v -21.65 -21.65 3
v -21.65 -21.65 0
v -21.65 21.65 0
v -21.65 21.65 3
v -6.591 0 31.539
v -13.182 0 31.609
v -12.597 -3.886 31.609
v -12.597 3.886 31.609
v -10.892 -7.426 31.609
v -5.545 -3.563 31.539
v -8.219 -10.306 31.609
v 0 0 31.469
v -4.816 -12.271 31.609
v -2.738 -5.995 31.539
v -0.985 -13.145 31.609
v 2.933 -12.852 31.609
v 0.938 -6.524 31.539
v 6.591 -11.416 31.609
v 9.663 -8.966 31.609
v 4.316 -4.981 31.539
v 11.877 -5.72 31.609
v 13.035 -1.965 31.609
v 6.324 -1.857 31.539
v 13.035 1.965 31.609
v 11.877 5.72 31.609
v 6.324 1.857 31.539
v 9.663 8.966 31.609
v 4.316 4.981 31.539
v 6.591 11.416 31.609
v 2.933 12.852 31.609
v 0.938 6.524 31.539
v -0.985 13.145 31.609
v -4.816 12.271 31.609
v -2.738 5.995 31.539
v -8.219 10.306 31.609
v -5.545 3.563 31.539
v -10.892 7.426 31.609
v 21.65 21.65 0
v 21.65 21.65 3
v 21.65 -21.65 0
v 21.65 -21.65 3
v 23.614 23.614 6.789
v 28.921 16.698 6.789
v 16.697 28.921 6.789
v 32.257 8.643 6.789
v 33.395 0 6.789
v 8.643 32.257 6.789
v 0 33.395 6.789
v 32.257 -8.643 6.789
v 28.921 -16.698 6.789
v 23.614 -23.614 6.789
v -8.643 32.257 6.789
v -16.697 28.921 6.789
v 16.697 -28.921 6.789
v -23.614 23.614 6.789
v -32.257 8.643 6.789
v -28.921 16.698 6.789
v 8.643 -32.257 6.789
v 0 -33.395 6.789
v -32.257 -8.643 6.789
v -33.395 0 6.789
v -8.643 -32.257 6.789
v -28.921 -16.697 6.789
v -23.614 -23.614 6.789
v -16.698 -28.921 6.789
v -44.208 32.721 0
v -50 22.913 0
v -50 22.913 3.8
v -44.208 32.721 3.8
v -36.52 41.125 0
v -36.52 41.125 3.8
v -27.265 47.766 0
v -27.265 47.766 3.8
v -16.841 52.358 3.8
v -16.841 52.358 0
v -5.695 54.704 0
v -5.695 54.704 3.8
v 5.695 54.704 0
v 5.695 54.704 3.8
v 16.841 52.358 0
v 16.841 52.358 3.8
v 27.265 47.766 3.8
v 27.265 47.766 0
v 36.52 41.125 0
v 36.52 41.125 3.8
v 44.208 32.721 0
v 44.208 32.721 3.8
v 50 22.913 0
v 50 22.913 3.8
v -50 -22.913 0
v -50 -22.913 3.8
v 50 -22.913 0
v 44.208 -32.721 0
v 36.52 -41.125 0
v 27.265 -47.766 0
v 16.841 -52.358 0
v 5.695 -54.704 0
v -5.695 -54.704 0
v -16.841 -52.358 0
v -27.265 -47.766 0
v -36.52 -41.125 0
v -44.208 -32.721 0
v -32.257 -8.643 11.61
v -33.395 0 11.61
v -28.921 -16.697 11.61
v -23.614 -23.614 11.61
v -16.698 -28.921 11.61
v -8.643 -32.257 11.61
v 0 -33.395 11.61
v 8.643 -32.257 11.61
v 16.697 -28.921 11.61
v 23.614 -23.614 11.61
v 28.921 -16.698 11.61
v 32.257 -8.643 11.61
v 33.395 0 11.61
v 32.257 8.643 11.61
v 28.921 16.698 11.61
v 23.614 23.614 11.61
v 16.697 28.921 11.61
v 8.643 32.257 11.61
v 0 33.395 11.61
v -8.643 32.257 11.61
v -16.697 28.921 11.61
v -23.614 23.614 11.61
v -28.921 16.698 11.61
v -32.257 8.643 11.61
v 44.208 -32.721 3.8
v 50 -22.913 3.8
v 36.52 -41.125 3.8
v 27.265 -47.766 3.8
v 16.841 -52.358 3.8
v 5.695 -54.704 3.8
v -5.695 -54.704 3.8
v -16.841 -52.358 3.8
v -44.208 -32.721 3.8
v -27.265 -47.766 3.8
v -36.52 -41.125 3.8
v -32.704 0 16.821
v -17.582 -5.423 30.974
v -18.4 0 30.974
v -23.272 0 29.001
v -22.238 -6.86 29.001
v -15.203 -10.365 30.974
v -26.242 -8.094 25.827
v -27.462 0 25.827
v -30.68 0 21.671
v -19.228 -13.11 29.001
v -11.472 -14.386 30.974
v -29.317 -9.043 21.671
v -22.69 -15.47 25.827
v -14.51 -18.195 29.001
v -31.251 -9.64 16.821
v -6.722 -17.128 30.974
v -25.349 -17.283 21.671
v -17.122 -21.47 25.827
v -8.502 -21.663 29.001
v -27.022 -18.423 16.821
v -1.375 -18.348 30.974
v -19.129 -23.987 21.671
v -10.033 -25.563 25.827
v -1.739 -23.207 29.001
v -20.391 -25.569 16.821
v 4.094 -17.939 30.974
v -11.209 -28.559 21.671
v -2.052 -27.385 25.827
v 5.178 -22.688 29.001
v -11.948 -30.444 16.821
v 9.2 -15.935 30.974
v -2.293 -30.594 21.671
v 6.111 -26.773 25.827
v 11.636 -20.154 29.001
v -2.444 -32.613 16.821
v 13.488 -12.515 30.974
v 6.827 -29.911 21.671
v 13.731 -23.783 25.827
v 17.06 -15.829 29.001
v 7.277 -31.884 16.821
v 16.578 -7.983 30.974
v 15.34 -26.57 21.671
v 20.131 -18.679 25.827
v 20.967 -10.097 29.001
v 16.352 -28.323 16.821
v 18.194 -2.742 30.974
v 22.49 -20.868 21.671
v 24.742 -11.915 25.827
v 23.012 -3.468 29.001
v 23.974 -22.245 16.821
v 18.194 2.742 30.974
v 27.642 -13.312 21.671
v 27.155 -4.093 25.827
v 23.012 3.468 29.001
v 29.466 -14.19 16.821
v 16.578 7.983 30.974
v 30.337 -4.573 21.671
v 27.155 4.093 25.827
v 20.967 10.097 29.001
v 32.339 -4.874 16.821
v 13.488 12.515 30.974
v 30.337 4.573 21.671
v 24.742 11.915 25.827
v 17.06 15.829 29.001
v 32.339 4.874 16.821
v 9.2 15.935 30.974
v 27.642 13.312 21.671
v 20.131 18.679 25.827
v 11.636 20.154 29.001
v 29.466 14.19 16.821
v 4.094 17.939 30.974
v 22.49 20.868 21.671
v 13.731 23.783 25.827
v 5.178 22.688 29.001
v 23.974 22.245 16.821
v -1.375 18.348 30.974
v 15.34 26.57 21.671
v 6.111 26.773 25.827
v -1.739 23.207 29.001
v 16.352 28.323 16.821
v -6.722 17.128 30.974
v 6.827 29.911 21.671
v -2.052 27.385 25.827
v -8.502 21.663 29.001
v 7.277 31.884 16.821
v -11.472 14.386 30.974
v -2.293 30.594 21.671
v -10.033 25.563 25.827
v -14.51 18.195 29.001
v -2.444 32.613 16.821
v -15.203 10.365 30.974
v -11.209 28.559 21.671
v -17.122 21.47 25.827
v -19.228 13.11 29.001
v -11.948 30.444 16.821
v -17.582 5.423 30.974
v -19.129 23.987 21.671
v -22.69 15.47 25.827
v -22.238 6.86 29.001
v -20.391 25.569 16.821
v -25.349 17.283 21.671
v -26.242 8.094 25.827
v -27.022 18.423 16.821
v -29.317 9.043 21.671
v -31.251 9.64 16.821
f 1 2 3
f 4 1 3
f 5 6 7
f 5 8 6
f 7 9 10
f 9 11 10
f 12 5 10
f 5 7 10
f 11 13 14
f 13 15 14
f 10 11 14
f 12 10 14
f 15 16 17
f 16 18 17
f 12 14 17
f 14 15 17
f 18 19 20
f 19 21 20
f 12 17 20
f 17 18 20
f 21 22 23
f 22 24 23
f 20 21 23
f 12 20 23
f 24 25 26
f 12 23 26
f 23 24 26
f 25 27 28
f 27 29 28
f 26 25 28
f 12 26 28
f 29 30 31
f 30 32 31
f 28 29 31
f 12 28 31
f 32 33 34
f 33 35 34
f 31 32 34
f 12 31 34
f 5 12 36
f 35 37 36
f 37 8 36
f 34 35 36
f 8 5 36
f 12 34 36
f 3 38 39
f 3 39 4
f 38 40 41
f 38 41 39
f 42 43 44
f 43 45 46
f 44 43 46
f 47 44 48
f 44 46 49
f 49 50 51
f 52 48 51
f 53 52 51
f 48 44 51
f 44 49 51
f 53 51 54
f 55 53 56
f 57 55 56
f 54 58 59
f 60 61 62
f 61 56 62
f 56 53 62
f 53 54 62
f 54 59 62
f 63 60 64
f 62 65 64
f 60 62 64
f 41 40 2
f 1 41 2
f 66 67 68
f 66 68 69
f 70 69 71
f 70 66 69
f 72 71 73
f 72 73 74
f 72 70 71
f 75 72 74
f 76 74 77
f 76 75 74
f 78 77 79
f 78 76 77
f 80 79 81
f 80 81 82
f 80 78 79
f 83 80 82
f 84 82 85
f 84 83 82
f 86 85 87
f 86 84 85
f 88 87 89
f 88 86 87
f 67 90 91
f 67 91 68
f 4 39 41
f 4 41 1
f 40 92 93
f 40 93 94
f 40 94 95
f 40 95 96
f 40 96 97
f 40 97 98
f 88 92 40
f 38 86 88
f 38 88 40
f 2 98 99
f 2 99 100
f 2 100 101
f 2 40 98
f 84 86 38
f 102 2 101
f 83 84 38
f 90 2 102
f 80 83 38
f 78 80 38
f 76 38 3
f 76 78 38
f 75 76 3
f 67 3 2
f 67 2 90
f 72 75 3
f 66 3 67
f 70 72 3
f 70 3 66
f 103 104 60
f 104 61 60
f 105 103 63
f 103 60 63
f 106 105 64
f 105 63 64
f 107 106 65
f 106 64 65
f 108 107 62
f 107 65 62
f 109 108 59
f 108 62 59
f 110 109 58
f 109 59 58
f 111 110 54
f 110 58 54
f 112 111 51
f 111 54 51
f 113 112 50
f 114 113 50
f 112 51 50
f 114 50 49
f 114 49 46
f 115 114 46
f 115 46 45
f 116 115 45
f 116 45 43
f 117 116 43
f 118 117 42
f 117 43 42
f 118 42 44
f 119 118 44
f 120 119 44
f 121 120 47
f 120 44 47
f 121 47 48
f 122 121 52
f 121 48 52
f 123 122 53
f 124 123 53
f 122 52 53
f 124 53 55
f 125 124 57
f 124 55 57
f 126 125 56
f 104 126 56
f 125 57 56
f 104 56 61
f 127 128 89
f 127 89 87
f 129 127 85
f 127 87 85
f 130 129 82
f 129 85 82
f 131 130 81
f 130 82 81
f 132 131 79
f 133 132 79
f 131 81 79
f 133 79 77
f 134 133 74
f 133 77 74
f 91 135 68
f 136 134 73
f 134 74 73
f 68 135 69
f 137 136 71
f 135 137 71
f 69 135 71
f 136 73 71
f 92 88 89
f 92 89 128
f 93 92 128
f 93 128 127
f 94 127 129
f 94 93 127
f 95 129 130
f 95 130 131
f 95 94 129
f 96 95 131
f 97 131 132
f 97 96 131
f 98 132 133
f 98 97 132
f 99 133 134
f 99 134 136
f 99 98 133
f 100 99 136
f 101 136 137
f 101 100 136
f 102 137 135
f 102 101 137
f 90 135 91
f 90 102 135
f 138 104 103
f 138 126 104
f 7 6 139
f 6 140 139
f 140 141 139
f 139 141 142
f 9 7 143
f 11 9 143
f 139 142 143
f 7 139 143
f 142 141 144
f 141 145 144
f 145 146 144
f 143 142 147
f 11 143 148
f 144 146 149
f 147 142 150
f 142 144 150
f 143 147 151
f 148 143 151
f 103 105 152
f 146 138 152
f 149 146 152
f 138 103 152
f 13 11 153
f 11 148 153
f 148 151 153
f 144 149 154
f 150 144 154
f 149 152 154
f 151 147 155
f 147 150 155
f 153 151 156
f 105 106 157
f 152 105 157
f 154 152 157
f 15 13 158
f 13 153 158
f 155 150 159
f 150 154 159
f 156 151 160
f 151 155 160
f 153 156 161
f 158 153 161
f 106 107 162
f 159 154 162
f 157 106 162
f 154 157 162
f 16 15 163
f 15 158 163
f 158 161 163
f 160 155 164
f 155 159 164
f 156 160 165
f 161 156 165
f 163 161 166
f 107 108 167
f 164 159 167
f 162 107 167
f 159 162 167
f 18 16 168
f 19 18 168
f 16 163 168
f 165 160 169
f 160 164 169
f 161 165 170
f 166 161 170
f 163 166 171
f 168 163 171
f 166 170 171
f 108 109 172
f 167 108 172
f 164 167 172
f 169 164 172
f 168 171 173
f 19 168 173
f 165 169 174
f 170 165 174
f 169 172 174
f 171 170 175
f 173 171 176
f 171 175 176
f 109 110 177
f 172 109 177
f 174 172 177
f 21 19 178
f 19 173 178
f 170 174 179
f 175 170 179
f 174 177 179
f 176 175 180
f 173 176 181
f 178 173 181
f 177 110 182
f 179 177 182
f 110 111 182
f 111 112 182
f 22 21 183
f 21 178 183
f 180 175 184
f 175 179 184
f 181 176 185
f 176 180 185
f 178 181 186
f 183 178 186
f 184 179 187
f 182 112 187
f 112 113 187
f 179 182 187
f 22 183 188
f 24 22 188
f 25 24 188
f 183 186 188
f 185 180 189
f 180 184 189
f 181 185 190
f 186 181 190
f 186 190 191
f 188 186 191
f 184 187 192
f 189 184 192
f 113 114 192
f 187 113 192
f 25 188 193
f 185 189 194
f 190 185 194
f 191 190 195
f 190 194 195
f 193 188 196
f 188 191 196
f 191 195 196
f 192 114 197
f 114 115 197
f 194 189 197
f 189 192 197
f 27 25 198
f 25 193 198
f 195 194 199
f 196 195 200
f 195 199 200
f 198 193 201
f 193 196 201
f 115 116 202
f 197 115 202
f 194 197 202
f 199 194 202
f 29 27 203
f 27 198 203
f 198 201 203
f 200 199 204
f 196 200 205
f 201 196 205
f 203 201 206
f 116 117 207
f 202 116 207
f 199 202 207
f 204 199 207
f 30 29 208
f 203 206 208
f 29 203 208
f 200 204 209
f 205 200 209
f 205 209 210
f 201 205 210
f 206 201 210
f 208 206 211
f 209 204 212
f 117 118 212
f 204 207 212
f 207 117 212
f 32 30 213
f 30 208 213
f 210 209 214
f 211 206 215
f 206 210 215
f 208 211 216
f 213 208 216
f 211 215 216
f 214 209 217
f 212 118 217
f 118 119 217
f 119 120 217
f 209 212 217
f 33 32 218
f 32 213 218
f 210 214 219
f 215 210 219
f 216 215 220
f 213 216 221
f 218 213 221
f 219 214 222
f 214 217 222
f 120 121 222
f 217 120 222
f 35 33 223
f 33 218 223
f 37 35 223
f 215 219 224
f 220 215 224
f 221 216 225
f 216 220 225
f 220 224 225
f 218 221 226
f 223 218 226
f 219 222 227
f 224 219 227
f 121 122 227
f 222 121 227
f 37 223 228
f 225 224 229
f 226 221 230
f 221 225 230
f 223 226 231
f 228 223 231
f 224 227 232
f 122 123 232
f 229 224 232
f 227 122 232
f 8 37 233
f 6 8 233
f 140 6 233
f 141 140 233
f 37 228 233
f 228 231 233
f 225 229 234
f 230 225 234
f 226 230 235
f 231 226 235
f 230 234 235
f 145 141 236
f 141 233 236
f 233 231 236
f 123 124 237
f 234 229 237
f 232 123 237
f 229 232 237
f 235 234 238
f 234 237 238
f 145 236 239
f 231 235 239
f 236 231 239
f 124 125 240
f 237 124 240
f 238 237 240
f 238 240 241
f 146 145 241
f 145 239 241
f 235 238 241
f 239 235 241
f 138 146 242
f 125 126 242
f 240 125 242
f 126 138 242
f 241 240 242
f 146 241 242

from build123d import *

# Parameters (mm, degrees)
BOSS_EXTRUDE1_DEPTH = 3.8
SKETCH4_W           = 43.3
SKETCH4_H           = 43.3
CUT_EXTRUDE1_DEPTH  = 3


with BuildPart() as part:
    # Sketch1 → Boss-Extrude1 (new body)
    with BuildSketch(Plane.XY):
        with BuildLine():
            Line((50, 22.912878475), (50, -22.912878475))
            ThreePointArc((50, -22.912878475), (0, -55), (-50, -22.912878475))
            Line((-50, -22.912878475), (-50, 22.912878475))
            ThreePointArc((-50, 22.912878475), (0, 55), (50, 22.912878475))
        make_face()
    extrude(amount=BOSS_EXTRUDE1_DEPTH)

    # Sketch4 → Cut-Extrude1 (cut)
    with BuildSketch(Plane(origin=(0, 0, 0), x_dir=(-1, 0, 0), z_dir=(0, 0, -1))):
        Rectangle(SKETCH4_W, SKETCH4_H)
    extrude(amount=-CUT_EXTRUDE1_DEPTH, mode=Mode.SUBTRACT)


with BuildPart() as body_2:
    # Sketch3 → Revolve1 (revolve)
    with BuildSketch(Plane(origin=(0, 0, 0), x_dir=(1, 0, 0), z_dir=(0, 1, 0)), mode=Mode.PRIVATE) as revolve1_sk:
        with BuildLine():
            Line((0, -6.78852246), (0, -31.46852246))
            Line((0, -31.46852246), (13.182201991, -31.608787716))
            ThreePointArc((13.182201991, -31.608787716), (27.46169897, -25.827091838), (33.395, -11.609919823))
            Line((33.395, -11.609919823), (33.395, -6.78852246))
            Line((33.395, -6.78852246), (0, -6.78852246))
        make_face()
    revolve(revolve1_sk.sketch.rotate(Axis((0, 0, 6.78852246), (0, 0, 1)), 180), axis=Axis((0, 0, 6.78852246), (0, 0, 1)))


solid = Compound([part.part, body_2.part])
